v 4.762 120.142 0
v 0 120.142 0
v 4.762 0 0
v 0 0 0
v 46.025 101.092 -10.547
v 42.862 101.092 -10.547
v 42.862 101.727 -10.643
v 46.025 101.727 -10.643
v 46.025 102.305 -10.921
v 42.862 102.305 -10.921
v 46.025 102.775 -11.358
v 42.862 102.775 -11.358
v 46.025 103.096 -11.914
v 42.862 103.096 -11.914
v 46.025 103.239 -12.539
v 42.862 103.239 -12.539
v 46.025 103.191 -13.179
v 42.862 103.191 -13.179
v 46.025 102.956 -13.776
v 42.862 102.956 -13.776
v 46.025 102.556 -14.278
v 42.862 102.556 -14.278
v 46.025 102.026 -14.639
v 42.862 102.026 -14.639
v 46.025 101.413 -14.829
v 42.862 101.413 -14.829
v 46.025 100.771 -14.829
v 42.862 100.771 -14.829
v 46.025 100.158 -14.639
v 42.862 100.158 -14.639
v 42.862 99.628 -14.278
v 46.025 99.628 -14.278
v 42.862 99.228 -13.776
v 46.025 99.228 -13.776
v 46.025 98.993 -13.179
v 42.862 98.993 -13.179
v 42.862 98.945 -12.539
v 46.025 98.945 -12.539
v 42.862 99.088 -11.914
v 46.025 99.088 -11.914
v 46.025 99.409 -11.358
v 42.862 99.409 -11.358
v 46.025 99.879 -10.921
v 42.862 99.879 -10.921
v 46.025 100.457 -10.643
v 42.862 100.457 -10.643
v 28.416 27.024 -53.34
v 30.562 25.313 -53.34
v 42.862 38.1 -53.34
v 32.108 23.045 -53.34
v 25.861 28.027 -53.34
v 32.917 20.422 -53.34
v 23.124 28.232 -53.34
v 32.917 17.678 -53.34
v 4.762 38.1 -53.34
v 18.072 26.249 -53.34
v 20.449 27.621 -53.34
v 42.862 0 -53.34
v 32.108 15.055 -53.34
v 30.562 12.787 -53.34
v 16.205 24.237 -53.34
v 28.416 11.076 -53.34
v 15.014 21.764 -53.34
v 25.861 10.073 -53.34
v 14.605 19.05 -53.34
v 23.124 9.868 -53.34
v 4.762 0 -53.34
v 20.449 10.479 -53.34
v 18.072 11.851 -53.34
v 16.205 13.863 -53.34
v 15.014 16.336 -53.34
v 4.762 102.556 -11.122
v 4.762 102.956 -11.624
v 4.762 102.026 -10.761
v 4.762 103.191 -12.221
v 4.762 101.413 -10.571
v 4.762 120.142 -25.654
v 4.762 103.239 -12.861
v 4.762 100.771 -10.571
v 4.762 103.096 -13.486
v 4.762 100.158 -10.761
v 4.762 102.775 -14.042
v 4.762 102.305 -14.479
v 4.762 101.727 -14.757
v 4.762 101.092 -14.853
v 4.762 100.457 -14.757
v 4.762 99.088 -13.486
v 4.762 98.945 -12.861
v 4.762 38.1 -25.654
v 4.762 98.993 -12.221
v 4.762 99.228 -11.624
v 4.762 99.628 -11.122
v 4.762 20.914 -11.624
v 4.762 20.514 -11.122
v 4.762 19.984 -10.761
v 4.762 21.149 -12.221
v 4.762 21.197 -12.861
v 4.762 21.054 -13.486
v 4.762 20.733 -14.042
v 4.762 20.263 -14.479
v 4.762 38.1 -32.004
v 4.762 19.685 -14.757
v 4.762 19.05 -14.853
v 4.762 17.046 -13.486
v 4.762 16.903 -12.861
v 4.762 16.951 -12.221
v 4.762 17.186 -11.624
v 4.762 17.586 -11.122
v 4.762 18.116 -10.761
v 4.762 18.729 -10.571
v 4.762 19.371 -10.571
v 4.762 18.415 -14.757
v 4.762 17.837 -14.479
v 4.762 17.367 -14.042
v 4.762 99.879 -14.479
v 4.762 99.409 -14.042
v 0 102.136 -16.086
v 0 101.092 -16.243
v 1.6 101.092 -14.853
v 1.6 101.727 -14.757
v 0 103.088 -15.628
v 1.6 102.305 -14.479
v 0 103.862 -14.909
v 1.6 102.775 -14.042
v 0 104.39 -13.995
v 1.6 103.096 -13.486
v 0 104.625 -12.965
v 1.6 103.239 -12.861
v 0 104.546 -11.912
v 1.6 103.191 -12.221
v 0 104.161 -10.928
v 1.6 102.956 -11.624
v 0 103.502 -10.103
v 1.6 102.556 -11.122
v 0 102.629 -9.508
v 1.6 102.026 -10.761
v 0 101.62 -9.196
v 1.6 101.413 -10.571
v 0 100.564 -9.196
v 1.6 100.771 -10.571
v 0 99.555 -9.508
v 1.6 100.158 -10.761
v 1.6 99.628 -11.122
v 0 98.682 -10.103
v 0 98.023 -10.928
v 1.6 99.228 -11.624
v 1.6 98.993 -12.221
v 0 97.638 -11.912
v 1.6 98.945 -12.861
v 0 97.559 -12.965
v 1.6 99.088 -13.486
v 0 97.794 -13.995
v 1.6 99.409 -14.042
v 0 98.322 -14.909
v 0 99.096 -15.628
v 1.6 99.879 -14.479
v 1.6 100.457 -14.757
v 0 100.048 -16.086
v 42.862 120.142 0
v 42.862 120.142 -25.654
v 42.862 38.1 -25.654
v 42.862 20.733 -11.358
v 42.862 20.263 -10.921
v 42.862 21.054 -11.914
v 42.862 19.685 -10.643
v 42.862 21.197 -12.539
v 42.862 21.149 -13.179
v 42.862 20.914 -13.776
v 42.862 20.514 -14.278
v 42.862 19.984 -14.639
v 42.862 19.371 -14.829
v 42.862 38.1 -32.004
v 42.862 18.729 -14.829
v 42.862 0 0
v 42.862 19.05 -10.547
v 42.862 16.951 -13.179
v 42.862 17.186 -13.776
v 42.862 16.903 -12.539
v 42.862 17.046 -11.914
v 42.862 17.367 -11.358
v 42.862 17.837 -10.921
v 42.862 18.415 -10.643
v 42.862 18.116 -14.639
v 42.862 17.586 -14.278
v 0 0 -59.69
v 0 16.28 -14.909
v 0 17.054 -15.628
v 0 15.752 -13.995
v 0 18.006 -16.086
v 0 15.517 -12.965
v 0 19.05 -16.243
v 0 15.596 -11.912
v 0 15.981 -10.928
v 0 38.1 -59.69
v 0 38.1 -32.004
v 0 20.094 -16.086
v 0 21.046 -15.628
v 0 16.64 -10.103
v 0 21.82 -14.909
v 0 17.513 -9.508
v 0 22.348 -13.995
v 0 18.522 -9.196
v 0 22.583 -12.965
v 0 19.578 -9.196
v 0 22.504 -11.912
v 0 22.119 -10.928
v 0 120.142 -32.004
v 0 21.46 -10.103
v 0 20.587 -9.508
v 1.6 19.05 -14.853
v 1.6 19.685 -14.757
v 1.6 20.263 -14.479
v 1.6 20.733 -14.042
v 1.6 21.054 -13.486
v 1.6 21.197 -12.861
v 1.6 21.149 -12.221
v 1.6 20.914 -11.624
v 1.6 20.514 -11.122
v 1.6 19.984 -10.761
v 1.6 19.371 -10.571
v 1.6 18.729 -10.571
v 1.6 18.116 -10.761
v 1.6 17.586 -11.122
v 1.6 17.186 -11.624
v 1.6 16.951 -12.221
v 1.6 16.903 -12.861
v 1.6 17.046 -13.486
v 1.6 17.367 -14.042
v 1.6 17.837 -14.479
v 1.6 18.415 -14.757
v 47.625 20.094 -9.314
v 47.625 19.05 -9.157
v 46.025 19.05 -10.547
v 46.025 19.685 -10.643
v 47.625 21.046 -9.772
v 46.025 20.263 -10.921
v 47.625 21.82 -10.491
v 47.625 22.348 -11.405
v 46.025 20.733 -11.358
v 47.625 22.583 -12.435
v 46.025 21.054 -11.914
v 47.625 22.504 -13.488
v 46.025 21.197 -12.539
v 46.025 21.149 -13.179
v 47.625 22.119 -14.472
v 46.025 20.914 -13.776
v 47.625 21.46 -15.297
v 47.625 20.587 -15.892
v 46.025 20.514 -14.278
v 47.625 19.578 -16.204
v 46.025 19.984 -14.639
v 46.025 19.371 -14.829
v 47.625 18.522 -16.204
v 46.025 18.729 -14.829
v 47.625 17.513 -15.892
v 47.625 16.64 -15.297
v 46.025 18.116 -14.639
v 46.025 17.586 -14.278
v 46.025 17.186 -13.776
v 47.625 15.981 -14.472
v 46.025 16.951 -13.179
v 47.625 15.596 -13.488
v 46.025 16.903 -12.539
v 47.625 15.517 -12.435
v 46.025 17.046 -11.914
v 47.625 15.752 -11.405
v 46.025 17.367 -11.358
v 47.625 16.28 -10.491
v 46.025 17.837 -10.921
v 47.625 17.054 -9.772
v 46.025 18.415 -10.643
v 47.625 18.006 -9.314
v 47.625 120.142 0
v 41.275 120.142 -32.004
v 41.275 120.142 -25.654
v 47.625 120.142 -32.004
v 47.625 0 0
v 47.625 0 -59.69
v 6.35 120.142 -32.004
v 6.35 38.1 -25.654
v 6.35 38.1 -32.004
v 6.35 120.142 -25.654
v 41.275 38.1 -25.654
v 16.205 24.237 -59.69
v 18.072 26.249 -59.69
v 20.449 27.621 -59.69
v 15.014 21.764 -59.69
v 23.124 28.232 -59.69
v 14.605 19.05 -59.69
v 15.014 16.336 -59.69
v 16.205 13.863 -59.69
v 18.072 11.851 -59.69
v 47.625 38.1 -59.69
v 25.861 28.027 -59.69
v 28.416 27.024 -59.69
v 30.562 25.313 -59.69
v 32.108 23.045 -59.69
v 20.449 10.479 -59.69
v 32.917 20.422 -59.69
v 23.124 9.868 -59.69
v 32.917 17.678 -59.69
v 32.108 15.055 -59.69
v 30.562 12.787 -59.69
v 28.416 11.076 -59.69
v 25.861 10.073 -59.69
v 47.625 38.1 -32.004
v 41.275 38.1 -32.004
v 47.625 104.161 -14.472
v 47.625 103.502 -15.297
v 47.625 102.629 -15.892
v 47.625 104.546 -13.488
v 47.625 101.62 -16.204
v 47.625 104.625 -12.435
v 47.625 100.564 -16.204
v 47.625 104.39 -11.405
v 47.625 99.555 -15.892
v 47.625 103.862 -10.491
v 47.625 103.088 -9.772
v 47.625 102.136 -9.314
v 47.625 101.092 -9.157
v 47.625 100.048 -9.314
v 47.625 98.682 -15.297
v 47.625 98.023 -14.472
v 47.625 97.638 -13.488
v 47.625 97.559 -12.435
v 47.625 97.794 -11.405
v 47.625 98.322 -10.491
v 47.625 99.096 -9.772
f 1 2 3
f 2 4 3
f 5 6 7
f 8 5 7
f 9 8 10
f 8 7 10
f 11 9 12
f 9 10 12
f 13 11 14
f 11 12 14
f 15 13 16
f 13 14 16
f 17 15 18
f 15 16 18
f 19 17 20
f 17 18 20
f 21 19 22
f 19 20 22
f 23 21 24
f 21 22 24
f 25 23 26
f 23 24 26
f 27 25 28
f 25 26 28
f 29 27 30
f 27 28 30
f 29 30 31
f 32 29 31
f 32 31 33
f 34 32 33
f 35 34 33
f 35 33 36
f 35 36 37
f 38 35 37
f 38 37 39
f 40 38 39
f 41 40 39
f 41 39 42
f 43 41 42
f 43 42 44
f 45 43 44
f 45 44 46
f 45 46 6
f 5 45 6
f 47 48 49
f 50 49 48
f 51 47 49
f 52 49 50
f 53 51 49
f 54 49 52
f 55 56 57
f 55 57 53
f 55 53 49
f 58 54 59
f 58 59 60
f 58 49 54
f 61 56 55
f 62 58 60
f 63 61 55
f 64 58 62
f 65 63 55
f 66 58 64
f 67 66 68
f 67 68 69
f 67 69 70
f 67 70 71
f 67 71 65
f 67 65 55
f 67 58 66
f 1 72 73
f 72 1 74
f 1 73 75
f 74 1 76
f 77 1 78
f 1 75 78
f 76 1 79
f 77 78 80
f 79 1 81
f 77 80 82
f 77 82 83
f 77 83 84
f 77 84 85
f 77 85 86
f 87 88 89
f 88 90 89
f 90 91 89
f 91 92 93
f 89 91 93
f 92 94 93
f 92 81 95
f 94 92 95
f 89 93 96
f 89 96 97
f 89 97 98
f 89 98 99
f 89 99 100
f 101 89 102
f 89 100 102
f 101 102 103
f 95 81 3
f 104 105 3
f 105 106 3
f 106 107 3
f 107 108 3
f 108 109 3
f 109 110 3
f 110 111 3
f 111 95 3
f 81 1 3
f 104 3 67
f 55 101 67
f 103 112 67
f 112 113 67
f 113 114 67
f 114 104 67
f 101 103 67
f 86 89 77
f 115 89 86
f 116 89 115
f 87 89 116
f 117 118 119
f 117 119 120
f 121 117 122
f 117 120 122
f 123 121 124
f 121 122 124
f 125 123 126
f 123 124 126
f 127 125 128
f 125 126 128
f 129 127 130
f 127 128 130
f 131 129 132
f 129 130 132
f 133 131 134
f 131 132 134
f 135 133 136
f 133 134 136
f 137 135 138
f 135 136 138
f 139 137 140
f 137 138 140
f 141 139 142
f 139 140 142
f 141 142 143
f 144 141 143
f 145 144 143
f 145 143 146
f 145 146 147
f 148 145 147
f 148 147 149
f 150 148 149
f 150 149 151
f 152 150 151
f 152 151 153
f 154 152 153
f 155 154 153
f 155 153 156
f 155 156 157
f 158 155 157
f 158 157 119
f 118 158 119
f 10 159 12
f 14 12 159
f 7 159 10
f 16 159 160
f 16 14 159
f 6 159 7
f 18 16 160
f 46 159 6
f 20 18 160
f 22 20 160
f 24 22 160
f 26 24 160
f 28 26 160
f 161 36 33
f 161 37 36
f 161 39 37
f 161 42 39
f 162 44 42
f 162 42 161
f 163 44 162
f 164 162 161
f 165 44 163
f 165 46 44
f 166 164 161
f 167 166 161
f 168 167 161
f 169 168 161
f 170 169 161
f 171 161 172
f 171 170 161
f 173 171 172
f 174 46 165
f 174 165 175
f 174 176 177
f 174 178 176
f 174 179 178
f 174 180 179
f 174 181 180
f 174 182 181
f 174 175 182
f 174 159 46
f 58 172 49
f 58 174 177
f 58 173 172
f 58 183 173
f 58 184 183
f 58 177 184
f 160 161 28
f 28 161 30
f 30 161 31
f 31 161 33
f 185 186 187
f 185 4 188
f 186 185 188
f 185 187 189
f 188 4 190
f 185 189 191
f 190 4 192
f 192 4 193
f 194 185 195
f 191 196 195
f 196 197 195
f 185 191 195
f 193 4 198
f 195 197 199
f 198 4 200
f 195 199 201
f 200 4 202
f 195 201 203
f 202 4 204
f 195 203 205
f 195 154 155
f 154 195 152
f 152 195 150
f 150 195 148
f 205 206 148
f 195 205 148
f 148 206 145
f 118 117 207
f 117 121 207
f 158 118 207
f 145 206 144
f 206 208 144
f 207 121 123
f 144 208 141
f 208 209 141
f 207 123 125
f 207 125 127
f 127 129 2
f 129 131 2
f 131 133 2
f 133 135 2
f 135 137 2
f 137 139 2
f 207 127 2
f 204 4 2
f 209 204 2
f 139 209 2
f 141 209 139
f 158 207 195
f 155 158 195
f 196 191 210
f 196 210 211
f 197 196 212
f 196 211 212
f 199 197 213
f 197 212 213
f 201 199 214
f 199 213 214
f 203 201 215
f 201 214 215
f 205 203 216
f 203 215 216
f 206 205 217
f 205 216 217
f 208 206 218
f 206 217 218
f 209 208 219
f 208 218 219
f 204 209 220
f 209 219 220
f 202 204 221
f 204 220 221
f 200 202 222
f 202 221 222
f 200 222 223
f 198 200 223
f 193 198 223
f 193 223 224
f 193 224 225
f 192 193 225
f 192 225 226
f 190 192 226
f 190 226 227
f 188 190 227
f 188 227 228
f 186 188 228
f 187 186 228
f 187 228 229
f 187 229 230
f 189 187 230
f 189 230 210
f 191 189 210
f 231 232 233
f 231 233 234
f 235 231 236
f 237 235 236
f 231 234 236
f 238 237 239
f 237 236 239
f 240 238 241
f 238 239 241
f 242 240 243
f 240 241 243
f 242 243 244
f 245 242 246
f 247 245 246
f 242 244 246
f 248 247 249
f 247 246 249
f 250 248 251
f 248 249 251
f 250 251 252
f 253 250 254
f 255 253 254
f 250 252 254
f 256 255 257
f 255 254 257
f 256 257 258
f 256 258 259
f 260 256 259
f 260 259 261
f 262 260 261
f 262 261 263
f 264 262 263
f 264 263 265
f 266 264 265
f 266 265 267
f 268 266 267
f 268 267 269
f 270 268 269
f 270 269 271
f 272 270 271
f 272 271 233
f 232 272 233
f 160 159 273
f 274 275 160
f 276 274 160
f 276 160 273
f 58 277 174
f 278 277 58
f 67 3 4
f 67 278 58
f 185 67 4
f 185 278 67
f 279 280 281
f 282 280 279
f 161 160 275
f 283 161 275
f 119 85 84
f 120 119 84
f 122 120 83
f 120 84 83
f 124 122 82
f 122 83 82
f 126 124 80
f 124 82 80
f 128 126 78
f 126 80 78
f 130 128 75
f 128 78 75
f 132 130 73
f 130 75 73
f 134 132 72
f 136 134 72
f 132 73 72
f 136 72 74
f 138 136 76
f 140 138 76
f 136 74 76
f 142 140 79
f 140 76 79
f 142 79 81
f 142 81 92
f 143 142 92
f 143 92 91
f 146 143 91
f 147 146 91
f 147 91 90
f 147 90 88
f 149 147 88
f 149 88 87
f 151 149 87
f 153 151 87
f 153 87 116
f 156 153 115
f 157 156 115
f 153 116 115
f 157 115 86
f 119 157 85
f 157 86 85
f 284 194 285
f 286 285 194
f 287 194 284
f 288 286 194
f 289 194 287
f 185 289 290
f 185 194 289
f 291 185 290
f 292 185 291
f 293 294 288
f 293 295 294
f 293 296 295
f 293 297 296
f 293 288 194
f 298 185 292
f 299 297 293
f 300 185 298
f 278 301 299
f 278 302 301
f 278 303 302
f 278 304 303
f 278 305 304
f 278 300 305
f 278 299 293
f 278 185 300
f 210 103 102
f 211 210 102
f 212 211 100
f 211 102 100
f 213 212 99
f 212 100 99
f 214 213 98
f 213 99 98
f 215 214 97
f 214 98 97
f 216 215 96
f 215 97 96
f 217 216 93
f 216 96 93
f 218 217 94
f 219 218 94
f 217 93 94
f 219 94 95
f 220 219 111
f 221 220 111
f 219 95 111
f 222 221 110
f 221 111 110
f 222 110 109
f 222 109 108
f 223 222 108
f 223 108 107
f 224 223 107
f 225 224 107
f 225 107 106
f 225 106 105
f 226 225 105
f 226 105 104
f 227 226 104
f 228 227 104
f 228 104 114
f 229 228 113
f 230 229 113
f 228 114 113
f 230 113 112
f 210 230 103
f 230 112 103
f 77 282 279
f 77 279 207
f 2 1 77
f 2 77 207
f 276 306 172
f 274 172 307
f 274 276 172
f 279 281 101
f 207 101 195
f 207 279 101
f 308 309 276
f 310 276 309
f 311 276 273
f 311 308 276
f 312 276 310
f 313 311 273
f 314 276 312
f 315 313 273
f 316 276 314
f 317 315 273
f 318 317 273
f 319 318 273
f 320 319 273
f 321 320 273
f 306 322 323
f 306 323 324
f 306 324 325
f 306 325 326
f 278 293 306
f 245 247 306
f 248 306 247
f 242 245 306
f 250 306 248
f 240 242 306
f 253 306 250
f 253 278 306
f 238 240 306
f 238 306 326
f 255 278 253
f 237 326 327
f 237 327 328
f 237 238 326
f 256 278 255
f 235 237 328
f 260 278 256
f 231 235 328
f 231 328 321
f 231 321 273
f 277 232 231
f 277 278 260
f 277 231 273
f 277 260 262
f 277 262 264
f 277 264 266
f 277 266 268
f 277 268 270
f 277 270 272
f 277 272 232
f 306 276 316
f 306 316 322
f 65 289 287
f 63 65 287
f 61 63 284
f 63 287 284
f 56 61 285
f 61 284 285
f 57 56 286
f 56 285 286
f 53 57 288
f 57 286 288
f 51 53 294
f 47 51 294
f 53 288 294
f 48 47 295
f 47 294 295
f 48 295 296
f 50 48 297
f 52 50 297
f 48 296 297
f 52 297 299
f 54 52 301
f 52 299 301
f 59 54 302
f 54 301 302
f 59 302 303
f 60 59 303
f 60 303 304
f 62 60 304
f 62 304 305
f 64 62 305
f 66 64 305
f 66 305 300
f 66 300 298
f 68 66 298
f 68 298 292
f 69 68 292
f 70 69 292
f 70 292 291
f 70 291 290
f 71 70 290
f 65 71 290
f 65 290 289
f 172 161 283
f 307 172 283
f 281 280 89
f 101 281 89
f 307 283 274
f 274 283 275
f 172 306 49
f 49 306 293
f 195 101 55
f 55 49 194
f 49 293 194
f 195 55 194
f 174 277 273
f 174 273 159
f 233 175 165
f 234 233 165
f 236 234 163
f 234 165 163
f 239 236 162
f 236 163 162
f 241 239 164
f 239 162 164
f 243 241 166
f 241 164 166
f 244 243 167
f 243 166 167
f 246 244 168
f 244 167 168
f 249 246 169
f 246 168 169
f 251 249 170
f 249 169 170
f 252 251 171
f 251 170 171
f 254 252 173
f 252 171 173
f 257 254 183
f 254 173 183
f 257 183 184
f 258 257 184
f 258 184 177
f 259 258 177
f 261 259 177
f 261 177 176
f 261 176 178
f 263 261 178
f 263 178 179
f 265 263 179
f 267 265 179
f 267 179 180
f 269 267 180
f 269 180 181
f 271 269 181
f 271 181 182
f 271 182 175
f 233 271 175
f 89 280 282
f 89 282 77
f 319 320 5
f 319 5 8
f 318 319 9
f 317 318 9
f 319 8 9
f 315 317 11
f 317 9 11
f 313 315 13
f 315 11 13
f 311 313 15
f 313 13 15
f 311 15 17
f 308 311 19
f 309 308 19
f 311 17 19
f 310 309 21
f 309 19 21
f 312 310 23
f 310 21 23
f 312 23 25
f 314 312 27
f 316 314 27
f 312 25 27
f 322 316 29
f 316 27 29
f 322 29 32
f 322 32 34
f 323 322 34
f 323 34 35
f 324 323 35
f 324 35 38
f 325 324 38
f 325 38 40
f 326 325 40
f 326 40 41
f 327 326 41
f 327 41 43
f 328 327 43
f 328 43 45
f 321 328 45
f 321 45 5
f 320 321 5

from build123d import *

# Parameters (mm, degrees)
BOSS_EXTRUDE1_DEPTH                            = 38.1
SKETCH7_R                                      = 9.2075
CUT_EXTRUDE2_DEPTH                             = 38.1
SKETCH8_W                                      = 4.7625
SKETCH8_H                                      = 25.654
BOSS_EXTRUDE2_DEPTH                            = 82.042
CSK_FOR_6_FLAT_HEAD_MACHINE_SCREW1_D           = 4.3053
CSK_FOR_6_FLAT_HEAD_MACHINE_SCREW1_DEPTH       = 4.7625
CSK_FOR_6_FLAT_HEAD_MACHINE_SCREW1_CSINK_D     = 7.0866
CSK_FOR_6_FLAT_HEAD_MACHINE_SCREW1_CSINK_ANGLE = 82
CSK_FOR_6_FLAT_HEAD_MACHINE_SCREW2_D           = 4.3053
CSK_FOR_6_FLAT_HEAD_MACHINE_SCREW2_CSINK_D     = 7.0866
CSK_FOR_6_FLAT_HEAD_MACHINE_SCREW2_CSINK_ANGLE = 82
SKETCH9_W                                      = 6.35
SKETCH9_H                                      = 82.042
BOSS_EXTRUDE3_DEPTH                            = 6.35


with BuildPart() as part:
    # Sketch1 → Boss-Extrude1 (new body)
    with BuildSketch(Plane(origin=(0, 0, 0), x_dir=(1, 0, 0), z_dir=(0, 1, 0))):
        Polygon((0, 0), (0, 59.69), (47.625, 59.69), (47.625, 0), (42.8625, 0), (42.8625, 53.34), (4.7625, 53.34), (4.7625, 0), align=None)
    extrude(amount=BOSS_EXTRUDE1_DEPTH)

    # Sketch7 → Cut-Extrude2 (cut)
    with BuildSketch(Plane(origin=(0, 0, -59.69), x_dir=(-1, 0, 0), z_dir=(0, 0, -1))):
        with Locations((-23.8125, 19.05)):
            Circle(SKETCH7_R)
    extrude(amount=-CUT_EXTRUDE2_DEPTH, mode=Mode.SUBTRACT)

    # Sketch8 → Boss-Extrude2 (add)
    with BuildSketch(Plane(origin=(0, 38.1, 0), x_dir=(1, 0, 0), z_dir=(0, 1, 0))):
        with Locations((2.38125, 12.827)):
            Rectangle(SKETCH8_W, SKETCH8_H)
        with Locations((45.24375, 12.827)):
            Rectangle(SKETCH8_W, SKETCH8_H)
    extrude(amount=BOSS_EXTRUDE2_DEPTH)

    # CSK for #6 Flat Head Machine Screw1
    with Locations(Plane.ZY):
        with Locations((-12.7, 19.05), (-12.7, 101.092)):
            CounterSinkHole(CSK_FOR_6_FLAT_HEAD_MACHINE_SCREW1_D / 2, CSK_FOR_6_FLAT_HEAD_MACHINE_SCREW1_CSINK_D / 2, depth=CSK_FOR_6_FLAT_HEAD_MACHINE_SCREW1_DEPTH, counter_sink_angle=CSK_FOR_6_FLAT_HEAD_MACHINE_SCREW1_CSINK_ANGLE)

    # CSK for #6 Flat Head Machine Screw2 (through all)
    with Locations(Plane(origin=(47.625, 0, 0), x_dir=(0, 0, -1), z_dir=(1, 0, 0))):
        with Locations((12.7, 19.05), (12.7, 101.092)):
            CounterSinkHole(CSK_FOR_6_FLAT_HEAD_MACHINE_SCREW2_D / 2, CSK_FOR_6_FLAT_HEAD_MACHINE_SCREW2_CSINK_D / 2, counter_sink_angle=CSK_FOR_6_FLAT_HEAD_MACHINE_SCREW2_CSINK_ANGLE)

    # Sketch9 → Boss-Extrude3 (add)
    with BuildSketch(Plane(origin=(0, 0, -25.654), x_dir=(-1, 0, 0), z_dir=(0, 0, -1))):
        with Locations((-3.175, 79.121)):
            Rectangle(SKETCH9_W, SKETCH9_H)
        with Locations((-44.45, 79.121)):
            Rectangle(SKETCH9_W, SKETCH9_H)
    extrude(amount=BOSS_EXTRUDE3_DEPTH)


solid = part.part
